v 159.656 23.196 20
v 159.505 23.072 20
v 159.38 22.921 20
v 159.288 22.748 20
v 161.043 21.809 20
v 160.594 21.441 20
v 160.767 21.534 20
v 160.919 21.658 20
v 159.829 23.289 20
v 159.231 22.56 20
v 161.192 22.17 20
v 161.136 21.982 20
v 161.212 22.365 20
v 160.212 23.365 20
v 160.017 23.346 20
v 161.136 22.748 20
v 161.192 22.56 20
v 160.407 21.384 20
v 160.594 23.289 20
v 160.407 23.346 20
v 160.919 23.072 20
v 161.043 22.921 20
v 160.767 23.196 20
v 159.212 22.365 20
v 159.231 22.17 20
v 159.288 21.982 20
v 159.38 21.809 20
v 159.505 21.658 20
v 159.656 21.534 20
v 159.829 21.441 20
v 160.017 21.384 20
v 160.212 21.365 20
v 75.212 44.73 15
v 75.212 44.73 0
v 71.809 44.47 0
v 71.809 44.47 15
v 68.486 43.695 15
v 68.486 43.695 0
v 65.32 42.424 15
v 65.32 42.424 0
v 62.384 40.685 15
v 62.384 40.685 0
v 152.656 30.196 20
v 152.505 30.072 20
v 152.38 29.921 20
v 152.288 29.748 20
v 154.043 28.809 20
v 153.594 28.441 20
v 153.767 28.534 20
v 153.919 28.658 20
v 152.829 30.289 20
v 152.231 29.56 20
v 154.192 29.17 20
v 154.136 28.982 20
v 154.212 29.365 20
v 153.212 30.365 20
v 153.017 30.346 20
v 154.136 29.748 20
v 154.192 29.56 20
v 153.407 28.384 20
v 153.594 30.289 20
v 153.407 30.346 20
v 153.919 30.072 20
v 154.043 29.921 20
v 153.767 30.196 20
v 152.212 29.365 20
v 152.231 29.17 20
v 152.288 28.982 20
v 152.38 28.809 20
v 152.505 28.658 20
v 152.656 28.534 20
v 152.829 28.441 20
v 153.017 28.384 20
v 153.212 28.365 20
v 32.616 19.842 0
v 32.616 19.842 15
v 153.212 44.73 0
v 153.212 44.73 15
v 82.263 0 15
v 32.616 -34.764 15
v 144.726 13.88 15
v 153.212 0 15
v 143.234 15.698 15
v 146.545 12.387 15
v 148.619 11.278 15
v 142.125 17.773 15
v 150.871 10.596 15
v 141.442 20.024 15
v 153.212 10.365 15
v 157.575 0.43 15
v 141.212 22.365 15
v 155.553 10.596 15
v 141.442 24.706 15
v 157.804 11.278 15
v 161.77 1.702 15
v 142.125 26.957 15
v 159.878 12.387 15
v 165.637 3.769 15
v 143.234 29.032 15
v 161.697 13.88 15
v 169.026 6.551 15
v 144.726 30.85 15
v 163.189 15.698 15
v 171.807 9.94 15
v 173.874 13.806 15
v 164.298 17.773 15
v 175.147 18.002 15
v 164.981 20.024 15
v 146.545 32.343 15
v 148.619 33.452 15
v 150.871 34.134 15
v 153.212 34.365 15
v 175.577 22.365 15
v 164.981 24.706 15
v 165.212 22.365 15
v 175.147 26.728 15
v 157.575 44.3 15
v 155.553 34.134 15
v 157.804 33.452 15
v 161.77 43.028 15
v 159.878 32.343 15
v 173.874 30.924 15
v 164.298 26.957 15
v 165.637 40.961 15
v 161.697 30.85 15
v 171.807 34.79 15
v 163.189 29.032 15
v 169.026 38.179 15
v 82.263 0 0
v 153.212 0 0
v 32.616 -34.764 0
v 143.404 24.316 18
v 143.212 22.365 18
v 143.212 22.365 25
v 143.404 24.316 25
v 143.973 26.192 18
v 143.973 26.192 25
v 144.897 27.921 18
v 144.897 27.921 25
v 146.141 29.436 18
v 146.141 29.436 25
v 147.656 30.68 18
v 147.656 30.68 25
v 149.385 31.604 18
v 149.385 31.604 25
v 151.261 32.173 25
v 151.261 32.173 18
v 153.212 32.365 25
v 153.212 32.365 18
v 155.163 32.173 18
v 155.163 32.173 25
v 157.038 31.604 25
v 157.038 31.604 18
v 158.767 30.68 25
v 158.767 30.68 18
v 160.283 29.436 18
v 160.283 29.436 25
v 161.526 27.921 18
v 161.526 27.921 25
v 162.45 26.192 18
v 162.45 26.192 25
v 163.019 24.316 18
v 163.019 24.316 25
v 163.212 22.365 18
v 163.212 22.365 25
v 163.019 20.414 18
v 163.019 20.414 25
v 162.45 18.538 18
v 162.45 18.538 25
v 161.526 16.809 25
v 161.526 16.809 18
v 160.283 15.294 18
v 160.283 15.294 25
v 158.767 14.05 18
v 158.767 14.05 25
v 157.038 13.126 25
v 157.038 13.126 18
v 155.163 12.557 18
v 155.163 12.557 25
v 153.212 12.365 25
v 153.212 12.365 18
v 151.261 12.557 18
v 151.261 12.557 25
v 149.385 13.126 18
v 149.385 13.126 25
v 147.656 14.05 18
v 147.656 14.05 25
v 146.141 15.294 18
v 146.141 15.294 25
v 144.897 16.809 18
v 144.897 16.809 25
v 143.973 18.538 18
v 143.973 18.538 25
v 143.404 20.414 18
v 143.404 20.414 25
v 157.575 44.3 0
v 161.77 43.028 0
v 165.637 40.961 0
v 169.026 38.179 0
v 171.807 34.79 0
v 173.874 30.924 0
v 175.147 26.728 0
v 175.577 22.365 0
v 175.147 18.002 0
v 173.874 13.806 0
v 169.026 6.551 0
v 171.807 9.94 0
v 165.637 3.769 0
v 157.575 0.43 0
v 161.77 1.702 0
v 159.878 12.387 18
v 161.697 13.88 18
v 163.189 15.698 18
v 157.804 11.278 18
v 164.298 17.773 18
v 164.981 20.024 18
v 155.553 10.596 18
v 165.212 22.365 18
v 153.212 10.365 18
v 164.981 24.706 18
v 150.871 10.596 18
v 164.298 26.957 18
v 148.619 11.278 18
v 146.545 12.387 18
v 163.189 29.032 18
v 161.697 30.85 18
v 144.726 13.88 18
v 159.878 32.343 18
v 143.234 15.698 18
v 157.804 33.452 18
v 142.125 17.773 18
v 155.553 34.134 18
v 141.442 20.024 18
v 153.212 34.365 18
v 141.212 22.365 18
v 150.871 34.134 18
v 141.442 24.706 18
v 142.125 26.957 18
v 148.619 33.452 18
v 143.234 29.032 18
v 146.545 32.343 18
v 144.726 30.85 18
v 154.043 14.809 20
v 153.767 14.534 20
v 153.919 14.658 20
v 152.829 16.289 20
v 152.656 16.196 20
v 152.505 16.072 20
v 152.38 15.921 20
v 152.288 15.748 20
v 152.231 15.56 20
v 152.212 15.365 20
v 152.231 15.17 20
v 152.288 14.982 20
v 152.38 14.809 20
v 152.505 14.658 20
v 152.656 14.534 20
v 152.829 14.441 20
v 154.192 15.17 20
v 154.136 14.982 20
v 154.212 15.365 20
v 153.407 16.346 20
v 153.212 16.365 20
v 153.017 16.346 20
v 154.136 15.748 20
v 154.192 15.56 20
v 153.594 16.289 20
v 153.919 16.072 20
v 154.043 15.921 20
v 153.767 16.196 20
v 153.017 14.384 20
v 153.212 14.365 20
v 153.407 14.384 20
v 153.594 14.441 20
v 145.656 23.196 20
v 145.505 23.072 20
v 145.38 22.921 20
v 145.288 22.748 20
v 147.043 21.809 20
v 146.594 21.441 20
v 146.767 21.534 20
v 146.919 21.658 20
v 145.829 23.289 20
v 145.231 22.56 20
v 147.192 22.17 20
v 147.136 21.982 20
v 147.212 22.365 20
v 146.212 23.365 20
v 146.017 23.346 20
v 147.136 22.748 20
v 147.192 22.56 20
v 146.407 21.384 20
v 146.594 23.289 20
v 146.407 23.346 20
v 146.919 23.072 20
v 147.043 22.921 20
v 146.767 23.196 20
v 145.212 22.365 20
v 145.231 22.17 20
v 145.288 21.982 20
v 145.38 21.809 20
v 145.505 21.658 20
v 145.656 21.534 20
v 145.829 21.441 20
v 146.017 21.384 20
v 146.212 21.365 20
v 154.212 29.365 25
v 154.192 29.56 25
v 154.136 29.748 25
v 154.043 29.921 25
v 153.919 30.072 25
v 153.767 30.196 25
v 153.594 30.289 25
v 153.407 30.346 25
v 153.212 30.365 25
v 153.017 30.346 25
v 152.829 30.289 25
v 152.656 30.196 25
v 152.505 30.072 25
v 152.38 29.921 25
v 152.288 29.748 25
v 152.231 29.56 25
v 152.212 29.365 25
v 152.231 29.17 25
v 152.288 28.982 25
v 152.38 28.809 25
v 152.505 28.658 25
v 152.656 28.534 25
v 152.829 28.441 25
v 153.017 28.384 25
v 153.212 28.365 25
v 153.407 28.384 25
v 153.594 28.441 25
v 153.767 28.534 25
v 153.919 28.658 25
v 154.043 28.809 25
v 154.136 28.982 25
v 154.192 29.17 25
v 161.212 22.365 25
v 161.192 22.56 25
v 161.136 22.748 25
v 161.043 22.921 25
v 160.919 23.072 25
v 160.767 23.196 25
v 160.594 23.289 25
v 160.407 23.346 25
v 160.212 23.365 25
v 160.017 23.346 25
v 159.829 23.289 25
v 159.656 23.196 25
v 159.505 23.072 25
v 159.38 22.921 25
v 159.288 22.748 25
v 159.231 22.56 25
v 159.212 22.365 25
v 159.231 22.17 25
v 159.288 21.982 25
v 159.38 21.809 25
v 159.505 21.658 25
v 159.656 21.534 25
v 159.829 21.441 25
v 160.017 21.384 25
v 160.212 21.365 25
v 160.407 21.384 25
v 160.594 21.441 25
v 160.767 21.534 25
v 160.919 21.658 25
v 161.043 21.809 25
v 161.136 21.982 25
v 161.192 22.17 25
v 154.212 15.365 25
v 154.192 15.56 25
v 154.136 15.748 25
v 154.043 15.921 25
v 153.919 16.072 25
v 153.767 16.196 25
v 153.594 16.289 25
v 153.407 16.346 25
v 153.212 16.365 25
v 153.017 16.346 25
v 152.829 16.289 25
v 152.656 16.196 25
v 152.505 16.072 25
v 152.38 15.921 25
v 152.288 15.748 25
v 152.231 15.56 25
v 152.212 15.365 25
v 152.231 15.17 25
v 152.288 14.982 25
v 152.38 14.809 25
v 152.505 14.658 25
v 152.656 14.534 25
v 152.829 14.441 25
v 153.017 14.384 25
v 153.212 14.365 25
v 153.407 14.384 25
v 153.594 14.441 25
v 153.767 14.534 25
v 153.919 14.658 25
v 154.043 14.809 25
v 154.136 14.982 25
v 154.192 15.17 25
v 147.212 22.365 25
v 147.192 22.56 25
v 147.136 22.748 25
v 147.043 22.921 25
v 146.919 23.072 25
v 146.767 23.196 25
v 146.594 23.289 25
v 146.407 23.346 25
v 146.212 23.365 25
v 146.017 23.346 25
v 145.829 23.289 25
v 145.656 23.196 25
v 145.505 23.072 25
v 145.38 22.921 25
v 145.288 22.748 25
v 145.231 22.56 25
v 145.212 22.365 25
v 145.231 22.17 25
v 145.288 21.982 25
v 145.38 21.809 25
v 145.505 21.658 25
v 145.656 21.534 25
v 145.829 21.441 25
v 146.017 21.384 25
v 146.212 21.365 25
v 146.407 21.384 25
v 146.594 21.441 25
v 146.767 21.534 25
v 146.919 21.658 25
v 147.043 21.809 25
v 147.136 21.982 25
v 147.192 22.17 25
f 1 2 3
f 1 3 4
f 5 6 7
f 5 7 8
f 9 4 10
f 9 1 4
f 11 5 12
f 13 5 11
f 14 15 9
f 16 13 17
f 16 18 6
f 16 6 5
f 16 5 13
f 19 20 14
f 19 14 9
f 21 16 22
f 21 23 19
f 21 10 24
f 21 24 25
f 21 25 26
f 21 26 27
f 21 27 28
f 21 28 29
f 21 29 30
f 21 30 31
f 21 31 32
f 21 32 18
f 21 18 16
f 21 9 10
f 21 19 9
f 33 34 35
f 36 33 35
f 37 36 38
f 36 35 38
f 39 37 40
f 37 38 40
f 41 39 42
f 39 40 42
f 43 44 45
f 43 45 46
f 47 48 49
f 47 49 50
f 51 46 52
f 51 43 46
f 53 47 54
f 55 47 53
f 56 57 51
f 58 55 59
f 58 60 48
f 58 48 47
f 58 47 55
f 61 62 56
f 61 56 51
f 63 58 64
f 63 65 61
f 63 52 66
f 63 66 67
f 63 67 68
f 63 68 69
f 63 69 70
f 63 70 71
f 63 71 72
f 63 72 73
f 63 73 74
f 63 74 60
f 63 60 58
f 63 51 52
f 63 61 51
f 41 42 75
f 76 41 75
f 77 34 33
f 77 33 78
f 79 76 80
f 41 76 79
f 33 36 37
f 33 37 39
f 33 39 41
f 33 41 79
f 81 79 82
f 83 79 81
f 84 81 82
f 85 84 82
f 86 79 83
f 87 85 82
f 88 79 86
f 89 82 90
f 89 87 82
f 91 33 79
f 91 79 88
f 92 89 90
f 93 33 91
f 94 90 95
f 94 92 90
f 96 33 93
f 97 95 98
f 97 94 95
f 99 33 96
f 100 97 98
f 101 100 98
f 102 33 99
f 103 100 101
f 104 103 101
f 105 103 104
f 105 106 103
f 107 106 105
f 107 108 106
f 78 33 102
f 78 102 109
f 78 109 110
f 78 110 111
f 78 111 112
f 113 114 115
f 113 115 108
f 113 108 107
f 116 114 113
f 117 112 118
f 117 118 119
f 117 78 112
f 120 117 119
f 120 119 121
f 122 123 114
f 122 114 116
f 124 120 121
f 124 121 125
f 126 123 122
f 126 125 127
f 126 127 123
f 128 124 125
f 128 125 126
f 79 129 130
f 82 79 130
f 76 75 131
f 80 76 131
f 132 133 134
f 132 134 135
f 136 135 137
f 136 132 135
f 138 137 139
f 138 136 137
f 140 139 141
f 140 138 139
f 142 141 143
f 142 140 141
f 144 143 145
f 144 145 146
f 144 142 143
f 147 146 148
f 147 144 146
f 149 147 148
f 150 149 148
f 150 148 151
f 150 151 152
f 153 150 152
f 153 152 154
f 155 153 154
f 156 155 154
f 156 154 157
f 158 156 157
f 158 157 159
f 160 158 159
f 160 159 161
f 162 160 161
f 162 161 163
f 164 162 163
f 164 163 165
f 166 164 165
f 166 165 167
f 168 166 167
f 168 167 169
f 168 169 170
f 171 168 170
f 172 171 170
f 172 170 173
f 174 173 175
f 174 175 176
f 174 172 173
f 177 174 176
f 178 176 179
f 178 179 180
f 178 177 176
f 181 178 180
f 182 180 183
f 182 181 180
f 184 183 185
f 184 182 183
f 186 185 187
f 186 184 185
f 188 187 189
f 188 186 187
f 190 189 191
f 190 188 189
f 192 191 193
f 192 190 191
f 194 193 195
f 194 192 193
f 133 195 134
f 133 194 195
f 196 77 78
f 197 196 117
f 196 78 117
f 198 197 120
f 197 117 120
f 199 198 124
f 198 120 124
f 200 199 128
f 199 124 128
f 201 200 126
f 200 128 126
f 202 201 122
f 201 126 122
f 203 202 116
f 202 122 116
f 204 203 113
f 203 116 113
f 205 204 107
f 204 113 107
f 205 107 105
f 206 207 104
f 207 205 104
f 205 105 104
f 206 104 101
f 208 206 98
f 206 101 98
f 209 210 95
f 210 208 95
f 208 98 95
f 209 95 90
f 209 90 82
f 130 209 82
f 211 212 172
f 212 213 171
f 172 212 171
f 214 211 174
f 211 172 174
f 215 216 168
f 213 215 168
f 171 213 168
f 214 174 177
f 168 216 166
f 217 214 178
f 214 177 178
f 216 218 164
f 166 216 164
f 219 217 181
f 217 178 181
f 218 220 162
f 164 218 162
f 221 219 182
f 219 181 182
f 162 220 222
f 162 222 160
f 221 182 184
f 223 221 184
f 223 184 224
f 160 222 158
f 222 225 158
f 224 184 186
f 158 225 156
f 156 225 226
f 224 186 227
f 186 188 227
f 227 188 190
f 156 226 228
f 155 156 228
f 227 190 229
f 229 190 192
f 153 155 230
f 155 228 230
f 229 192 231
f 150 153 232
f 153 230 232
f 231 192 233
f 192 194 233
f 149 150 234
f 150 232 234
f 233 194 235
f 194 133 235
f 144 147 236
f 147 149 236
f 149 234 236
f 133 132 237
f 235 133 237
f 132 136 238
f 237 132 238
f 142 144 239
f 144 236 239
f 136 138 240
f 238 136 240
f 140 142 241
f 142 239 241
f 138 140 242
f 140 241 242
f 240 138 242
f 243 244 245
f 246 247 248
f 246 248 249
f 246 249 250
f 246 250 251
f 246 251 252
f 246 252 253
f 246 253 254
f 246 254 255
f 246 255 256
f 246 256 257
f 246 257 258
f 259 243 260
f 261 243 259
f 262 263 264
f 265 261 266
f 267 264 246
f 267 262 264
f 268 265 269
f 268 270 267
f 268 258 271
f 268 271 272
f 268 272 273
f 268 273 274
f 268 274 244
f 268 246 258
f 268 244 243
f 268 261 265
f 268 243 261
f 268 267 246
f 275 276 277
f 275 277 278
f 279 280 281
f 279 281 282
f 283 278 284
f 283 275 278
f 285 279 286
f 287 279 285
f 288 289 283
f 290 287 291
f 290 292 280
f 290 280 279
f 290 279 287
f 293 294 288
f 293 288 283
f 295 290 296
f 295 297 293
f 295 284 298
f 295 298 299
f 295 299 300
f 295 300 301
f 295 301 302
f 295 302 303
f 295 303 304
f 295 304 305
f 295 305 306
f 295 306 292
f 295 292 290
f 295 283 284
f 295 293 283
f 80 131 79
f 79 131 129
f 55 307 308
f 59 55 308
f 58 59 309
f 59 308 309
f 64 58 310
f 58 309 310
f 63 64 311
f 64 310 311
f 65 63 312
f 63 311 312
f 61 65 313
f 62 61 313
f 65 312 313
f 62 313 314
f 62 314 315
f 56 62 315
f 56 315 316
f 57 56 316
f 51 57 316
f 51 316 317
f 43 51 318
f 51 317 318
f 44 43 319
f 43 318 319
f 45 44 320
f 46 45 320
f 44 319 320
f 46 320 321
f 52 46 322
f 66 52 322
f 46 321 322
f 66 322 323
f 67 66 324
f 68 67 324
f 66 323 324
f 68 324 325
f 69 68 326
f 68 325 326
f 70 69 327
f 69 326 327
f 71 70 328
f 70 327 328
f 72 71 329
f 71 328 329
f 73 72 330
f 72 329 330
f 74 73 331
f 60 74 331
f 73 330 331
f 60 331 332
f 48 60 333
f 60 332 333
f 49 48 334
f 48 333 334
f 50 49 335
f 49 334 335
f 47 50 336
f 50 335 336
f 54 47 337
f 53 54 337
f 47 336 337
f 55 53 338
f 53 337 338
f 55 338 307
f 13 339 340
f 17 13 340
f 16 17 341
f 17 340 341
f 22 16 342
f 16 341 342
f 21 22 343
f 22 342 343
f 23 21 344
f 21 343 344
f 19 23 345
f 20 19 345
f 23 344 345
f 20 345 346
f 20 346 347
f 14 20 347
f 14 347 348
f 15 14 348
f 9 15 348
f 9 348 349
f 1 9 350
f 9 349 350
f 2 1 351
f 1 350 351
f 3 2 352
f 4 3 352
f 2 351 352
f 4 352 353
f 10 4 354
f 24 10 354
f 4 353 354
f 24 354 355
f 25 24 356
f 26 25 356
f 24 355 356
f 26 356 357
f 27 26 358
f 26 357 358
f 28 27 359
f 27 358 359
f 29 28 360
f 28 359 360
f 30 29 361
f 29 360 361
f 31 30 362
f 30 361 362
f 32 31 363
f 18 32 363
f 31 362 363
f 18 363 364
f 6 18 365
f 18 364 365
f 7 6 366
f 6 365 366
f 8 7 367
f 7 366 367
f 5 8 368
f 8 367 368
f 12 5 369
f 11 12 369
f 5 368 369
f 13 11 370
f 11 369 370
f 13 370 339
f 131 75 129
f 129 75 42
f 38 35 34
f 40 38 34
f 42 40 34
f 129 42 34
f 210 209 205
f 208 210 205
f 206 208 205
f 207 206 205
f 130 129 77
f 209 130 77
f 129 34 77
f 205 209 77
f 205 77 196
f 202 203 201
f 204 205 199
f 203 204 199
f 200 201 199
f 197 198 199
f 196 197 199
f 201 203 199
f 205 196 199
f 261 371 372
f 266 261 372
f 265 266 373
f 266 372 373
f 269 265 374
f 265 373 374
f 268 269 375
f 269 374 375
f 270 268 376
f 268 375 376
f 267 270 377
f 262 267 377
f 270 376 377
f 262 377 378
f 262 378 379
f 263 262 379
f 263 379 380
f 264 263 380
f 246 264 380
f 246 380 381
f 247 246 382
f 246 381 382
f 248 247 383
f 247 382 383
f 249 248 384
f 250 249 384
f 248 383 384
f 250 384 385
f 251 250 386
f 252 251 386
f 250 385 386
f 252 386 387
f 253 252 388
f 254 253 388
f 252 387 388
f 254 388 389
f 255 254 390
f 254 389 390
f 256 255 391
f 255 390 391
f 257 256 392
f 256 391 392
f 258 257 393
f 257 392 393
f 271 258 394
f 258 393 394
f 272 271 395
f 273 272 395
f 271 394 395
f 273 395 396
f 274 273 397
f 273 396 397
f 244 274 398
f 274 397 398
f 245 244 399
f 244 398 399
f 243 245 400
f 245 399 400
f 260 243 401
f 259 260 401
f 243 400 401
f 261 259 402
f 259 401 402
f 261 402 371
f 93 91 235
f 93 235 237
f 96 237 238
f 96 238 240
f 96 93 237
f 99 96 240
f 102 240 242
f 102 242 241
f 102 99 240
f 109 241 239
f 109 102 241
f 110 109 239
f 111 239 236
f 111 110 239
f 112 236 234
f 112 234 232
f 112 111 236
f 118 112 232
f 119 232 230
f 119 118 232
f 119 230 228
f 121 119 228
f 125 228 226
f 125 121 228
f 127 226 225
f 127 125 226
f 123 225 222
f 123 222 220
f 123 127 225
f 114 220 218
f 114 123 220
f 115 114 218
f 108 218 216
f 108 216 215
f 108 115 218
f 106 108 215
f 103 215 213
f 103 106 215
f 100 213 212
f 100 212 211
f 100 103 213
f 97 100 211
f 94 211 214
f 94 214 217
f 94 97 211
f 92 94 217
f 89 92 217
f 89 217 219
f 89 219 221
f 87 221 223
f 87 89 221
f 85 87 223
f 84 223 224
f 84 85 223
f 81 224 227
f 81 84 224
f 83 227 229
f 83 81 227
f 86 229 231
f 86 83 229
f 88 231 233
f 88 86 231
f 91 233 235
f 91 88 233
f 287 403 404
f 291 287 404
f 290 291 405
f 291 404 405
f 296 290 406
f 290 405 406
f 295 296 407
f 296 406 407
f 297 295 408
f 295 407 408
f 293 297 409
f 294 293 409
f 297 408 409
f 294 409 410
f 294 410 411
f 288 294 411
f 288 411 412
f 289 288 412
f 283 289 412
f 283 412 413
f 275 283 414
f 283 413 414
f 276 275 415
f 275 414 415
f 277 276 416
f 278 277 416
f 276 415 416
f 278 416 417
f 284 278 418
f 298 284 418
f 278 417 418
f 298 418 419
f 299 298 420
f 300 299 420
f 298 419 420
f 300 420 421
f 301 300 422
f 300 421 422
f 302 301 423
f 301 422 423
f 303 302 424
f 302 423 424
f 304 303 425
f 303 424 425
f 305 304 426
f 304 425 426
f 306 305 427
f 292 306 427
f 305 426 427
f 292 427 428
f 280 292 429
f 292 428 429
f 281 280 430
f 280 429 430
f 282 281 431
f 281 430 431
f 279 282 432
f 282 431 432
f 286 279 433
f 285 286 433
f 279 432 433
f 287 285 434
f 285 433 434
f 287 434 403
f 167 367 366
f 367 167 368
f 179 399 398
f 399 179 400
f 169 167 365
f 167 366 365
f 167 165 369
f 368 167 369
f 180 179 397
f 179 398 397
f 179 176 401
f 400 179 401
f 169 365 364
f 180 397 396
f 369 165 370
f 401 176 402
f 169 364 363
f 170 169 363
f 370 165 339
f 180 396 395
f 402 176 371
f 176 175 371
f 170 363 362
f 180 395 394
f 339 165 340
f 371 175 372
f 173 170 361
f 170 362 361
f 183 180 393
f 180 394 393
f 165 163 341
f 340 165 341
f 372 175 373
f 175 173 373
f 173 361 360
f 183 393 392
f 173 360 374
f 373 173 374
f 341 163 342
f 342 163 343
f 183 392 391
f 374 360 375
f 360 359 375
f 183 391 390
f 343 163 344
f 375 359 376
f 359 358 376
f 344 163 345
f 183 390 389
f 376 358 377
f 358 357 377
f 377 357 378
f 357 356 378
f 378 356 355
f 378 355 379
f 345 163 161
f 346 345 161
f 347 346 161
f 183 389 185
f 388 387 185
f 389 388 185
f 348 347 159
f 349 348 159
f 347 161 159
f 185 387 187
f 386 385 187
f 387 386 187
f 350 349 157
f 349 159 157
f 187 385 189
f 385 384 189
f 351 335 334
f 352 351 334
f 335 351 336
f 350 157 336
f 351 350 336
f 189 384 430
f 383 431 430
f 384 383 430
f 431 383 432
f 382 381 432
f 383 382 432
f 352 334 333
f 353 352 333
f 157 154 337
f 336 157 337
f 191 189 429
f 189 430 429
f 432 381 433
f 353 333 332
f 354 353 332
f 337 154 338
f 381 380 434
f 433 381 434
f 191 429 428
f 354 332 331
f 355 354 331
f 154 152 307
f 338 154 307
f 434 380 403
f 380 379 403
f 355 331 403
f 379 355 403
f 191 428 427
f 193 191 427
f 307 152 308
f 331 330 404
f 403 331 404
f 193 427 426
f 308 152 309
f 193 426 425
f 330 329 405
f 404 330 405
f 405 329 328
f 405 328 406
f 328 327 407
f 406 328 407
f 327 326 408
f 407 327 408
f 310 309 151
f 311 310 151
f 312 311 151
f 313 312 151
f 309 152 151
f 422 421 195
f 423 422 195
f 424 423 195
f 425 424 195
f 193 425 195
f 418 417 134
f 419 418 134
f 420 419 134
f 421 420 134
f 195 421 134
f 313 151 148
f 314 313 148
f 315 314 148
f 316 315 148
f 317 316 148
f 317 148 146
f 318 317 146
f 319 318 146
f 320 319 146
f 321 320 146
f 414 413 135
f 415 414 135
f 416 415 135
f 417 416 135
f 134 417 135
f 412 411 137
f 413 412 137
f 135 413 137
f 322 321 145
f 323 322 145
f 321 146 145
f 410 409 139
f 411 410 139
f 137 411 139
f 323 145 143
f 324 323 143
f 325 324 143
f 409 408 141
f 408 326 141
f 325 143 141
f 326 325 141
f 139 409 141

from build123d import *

# Parameters (mm, degrees)
SKETCH_1_W          = 300
SKETCH_1_H          = 44.73
EXTRUDE_1_DEPTH     = 15
CUT_EXTRUDE_4_REACH = 305.687
EXTRUDE_START       = -15
SKETCH_6_R          = 10
EXTRUDE_2_DEPTH     = 10
SKETCH_7_R          = 1
CUT_EXTRUDE_6_DEPTH = 5
EXTRUDE_5_DEPTH     = 15
CUT_EXTRUDE_7_DEPTH = 15
SKETCH_11_R         = 12
SKETCH_11_R_2       = 10
EXTRUDE_6_DEPTH     = 3


with BuildPart() as part:
    # 草图1 → 凸台-拉伸1 (new body)
    with BuildSketch(Plane.XY):
        with Locations((150, 22.365)):
            Rectangle(SKETCH_1_W, SKETCH_1_H)
    extrude(amount=EXTRUDE_1_DEPTH)

    # 草图4 → 切除-拉伸4 (cut, up to next)
    with BuildSketch(Plane.XY.offset(15), mode=Mode.PRIVATE) as cut_extrude_4_sk1:
        with BuildLine():
            Line((300, 44.73), (153.211623388, 44.73))
            ThreePointArc((153.211623388, 44.73), (175.576623388, 22.365), (153.211623388, 0))
            Line((153.211623388, 0), (300, 0))
            Line((300, 0), (300, 44.73))
        make_face()
    cut_extrude_4_tool1 = extrude(cut_extrude_4_sk1.sketch, amount=-CUT_EXTRUDE_4_REACH, mode=Mode.PRIVATE) & part.part
    add(cut_extrude_4_tool1.solids().sort_by_distance((235.292113, 22.365, 15))[0], mode=Mode.SUBTRACT)

    # 草图6 → 凸台-拉伸2 (add)
    with BuildSketch(Plane(origin=(0, 0, 0), x_dir=(-1, 0, 0), z_dir=(0, 0, -1)).offset(EXTRUDE_START)):
        with Locations((-153.211623388, 22.365)):
            Circle(SKETCH_6_R)
    extrude(amount=-EXTRUDE_2_DEPTH)

    # 草图7 → 切除-拉伸6 (cut)
    with BuildSketch(Plane.XY.offset(25)):
        with Locations((153.211623388, 29.365)):
            Circle(SKETCH_7_R)
        with Locations((160.211623388, -284.058246776)):
            Circle(SKETCH_7_R)
        with Locations((-153.211623388, -291.058246776)):
            Circle(SKETCH_7_R)
        with Locations((-160.211623388, 22.365)):
            Circle(SKETCH_7_R)
        with Locations((160.211623388, 22.365)):
            Circle(SKETCH_7_R)
        with Locations((153.211623388, 15.365)):
            Circle(SKETCH_7_R)
        with Locations((146.211623388, 22.365)):
            Circle(SKETCH_7_R)
    extrude(amount=-CUT_EXTRUDE_6_DEPTH, mode=Mode.SUBTRACT)

    # 草图9 → 凸台-拉伸5 (add)
    with BuildSketch(Plane.XY):
        Polygon((32.615717085, -34.763598368), (82.263280801, 0), (32.615717085, 0), align=None)
    extrude(amount=EXTRUDE_5_DEPTH)

    # 草图10 → 切除-拉伸7 (cut)
    with BuildSketch(Plane(origin=(0, 0, 0), x_dir=(-1, 0, 0), z_dir=(0, 0, -1))):
        with BuildLine():
            Line((-32.615717085, 19.841648987), (-32.615717085, 0))
            Line((-32.615717085, 0), (0, 0))
            Line((0, 0), (0, 44.73))
            Line((0, 44.73), (-75.211623388, 44.73))
            ThreePointArc((-75.211623388, 44.73), (-68.486338182, 43.694879603), (-62.383586389, 40.685335471))
            Line((-62.383586389, 40.685335471), (-32.615717085, 19.841648987))
        make_face()
    extrude(amount=-CUT_EXTRUDE_7_DEPTH, mode=Mode.SUBTRACT)

    # 草图11 → 凸台-拉伸6 (add)
    with BuildSketch(Plane(origin=(0, 0, 0), x_dir=(-1, 0, 0), z_dir=(0, 0, -1)).offset(EXTRUDE_START)):
        with Locations((-153.211623388, 22.365)):
            Circle(SKETCH_11_R)
        with Locations((-153.211623388, 22.365)):
            Circle(SKETCH_11_R_2, mode=Mode.SUBTRACT)
    extrude(amount=-EXTRUDE_6_DEPTH)


solid = part.part
